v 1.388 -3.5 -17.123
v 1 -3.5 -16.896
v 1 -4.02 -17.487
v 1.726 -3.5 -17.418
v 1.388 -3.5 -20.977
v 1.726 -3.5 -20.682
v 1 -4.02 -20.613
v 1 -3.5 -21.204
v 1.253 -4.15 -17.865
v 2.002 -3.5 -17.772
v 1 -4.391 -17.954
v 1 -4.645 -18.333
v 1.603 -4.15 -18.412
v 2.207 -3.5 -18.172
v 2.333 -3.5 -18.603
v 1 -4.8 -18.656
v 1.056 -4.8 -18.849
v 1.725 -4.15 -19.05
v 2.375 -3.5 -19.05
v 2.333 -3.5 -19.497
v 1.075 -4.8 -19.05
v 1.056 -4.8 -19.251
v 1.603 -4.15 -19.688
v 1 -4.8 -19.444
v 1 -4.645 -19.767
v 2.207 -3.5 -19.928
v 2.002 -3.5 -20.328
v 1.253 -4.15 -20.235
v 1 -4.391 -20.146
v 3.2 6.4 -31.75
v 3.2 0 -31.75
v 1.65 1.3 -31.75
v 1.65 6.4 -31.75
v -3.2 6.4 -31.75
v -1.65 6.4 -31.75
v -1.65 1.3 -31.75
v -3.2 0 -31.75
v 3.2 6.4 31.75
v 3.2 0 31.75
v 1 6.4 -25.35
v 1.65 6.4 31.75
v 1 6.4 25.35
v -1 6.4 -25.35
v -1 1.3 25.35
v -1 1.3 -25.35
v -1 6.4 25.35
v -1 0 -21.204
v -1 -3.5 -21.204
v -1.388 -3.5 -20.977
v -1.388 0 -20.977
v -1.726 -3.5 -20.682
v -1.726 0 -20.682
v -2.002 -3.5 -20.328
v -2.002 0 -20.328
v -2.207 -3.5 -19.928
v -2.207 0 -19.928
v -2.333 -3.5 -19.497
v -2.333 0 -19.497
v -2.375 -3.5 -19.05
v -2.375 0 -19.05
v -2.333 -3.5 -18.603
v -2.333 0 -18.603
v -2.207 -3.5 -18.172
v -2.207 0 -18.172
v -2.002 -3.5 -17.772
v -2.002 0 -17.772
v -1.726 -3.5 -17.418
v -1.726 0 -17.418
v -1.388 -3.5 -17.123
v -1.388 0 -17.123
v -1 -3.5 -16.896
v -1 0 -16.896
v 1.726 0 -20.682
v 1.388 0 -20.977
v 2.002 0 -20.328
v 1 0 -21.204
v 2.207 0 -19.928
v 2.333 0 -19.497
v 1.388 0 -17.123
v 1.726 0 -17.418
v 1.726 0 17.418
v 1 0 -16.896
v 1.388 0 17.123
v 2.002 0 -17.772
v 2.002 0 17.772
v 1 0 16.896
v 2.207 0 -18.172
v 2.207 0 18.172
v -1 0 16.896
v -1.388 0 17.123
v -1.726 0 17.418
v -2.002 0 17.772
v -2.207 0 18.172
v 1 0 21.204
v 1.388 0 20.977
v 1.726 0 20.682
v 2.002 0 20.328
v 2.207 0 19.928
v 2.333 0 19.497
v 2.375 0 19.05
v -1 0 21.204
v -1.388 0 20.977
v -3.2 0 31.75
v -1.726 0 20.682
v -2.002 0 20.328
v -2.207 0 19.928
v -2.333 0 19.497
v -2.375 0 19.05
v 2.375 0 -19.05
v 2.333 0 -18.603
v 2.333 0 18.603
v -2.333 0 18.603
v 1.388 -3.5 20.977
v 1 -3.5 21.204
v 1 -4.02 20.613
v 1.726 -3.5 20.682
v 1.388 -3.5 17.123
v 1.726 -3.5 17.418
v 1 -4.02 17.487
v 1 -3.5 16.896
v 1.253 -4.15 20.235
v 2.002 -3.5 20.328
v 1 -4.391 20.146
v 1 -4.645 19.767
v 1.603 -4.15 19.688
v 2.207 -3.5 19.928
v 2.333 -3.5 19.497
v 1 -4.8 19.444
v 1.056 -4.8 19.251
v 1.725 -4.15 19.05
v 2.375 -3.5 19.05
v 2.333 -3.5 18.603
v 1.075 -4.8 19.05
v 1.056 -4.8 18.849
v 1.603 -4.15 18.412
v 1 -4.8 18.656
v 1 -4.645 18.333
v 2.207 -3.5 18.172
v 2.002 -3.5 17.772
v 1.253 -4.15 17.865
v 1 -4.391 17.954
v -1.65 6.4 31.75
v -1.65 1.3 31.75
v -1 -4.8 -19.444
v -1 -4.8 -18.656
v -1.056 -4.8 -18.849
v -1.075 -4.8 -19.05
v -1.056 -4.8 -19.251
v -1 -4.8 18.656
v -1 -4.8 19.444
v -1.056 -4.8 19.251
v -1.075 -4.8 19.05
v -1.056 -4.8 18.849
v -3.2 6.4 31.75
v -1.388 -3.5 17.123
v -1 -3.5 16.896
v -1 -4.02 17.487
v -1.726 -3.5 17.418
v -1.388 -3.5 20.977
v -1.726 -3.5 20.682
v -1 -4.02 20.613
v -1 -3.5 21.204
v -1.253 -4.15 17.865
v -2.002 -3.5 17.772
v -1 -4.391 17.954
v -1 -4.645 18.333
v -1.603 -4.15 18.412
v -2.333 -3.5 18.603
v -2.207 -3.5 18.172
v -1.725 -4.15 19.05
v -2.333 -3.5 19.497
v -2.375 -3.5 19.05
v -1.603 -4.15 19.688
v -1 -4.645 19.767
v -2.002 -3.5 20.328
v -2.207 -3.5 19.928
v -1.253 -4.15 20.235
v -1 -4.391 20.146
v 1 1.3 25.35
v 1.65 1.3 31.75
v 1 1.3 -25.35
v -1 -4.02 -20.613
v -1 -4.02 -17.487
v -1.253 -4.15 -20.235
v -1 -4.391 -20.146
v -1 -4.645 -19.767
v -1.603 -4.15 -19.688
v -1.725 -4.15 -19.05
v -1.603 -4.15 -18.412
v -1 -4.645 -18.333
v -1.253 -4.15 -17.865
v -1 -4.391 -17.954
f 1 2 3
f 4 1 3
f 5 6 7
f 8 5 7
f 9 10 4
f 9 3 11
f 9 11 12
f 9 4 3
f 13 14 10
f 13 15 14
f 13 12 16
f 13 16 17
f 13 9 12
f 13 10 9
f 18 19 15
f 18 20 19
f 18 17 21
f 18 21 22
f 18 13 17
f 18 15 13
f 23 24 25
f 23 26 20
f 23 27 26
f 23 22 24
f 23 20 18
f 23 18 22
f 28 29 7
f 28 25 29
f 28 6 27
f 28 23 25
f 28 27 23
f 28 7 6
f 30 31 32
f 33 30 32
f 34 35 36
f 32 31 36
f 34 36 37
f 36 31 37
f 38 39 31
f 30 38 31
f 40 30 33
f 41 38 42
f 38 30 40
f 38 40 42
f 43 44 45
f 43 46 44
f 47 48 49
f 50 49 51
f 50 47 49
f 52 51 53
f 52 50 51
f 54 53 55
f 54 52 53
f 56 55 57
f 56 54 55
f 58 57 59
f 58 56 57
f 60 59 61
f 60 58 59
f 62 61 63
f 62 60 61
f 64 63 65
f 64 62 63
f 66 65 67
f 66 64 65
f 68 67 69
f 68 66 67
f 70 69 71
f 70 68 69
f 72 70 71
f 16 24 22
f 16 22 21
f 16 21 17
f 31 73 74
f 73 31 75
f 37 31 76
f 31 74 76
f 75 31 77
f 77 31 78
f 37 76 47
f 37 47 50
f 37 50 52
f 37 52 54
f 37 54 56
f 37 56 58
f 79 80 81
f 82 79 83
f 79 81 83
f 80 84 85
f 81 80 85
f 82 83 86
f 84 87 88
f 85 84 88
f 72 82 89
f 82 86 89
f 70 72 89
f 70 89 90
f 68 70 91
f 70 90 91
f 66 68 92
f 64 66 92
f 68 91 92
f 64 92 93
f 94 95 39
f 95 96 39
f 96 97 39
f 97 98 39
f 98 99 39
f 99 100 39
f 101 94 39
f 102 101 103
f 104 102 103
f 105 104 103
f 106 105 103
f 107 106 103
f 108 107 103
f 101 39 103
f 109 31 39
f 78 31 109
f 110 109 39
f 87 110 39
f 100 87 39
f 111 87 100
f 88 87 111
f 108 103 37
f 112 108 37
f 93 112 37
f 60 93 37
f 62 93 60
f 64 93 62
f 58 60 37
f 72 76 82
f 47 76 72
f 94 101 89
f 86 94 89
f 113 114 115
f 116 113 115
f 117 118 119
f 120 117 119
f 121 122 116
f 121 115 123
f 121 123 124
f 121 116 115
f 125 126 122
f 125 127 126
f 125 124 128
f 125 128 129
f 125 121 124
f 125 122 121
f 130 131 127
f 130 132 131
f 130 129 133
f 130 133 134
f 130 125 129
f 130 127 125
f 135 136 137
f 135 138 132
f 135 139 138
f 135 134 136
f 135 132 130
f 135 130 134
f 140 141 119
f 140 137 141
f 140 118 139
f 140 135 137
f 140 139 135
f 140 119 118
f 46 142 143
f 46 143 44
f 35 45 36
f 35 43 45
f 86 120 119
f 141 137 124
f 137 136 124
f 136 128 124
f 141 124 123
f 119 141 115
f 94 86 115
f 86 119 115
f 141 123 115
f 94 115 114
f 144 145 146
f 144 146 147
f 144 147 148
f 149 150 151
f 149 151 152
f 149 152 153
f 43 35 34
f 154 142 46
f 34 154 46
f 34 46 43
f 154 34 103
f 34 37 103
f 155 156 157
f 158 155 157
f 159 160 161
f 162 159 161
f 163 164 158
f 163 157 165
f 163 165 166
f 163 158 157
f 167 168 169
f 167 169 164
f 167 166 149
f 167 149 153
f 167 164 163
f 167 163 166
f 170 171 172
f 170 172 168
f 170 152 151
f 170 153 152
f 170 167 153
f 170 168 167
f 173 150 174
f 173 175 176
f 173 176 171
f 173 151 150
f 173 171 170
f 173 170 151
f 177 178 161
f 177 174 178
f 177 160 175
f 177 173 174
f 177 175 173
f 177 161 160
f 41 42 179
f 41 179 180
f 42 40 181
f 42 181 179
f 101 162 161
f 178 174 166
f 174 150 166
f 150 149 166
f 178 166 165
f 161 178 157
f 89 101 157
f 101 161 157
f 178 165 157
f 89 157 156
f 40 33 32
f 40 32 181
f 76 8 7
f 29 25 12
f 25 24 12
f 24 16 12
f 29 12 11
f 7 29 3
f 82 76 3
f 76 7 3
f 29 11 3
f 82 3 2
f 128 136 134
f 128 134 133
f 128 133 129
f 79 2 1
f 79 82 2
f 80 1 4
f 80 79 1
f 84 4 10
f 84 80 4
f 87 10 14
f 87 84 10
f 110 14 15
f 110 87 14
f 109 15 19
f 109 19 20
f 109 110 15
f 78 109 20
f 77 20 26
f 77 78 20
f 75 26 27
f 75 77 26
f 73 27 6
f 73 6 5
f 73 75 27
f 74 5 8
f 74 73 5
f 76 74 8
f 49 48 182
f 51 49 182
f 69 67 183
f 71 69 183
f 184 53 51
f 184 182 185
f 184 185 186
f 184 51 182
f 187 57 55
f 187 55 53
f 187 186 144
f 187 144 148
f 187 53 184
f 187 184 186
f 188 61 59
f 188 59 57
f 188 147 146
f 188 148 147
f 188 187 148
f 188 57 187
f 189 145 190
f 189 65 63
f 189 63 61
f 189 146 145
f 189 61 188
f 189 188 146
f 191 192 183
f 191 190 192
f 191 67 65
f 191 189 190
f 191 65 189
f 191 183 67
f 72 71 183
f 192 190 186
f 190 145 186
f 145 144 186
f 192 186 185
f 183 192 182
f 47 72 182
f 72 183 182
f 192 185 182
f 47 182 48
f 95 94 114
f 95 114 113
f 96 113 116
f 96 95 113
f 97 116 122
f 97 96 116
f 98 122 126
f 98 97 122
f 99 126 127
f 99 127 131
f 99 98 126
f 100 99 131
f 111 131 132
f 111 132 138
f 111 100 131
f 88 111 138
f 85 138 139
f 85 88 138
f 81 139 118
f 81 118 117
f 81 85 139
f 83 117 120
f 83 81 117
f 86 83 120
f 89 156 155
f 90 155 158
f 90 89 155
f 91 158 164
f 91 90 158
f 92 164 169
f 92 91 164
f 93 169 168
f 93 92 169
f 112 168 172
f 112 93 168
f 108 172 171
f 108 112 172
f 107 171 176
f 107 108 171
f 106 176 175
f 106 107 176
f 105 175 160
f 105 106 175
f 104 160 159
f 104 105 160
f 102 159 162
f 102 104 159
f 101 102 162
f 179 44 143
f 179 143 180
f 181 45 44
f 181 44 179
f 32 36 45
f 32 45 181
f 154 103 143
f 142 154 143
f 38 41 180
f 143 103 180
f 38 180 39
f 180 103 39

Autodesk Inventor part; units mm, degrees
ref_plane "YZ Plane" through (0, 0, 0) normal (1, 0, 0) x (0, 1, 0)
ref_plane "XZ Plane" through (0, 0, 0) normal (0, 1, 0) x (-1, 0, 0)
ref_plane "XY Plane" through (0, 0, 0) normal (0, 0, 1) x (1, 0, 0)
sketch "Esquisse1" plane through (0, 0, 0) normal (0, 1, 0) x (-1, 0, 0)
  line L0 (3.2, 31.75) -> (-3.2, 31.75)
  line L1 (-3.2, 31.75) -> (-3.2, -31.75)
  line L2 (-3.2, -31.75) -> (3.2, -31.75)
  line L3 (3.2, -31.75) -> (3.2, 31.75)
  point P0 (0, 0)
  dimension "d0" = 63.5
  dimension "d1" = 6.4
  dimension "d2" = 3.2
  dimension "d3" = 31.75
extrude "Extrusion1" add sketch "Esquisse1" along normal blind 6.4
sketch "Esquisse2" plane through (0, 6.4, 0) normal (0, 1, 0) x (1, 0, 0)
  line L0 (-3.2, -31.75) -> (3.2, -31.75) projected
  line L1 (-1.65, -31.75) -> (-1, -25.35)
  line L2 (-1, -25.35) -> (-1, 25.35)
  line L3 (-1, 25.35) -> (-1.65, 31.75)
  line L4 (3.2, 31.75) -> (-3.2, 31.75) projected
  line L5 (-1.65, 31.75) -> (1.65, 31.75)
  line L6 (1.65, 31.75) -> (1, 25.35)
  line L7 (1, 25.35) -> (1, -25.35)
  line L8 (1, -25.35) -> (1.65, -31.75)
  line L9 (1.65, -31.75) -> (-1.65, -31.75)
  point P0 (0, 0)
  dimension "d6" = 3.3
  dimension "d7" = 3.3
  dimension "d8" = 1.65
  dimension "d9" = 1.65
  dimension "d10" = 2
  dimension "d11" = 1
  dimension "d12" = 6.4
  dimension "d13" = 6.4
  dimension "d14" = 6.4
  dimension "d15" = 6.4
extrude "Extrusion2" cut sketch "Esquisse2" against normal blind 5.1
sketch "Esquisse3" plane through (0, 0, 0) normal (0, -1, 0) x (1, 0, 0)
  circle A0 centre (0, 19.05) radius 2.375
  circle A1 centre (0, -19.05) radius 2.375
  line L0 (-3.2, -31.75) -> (-3.2, 31.75) projected
  line L1 (3.2, 31.75) -> (3.2, -31.75) projected
  point P0 (0, 0)
  dimension "d18" = 4.75
  dimension "d19" = 19.05
  dimension "d20" = 38.1
  dimension "d21" = 4.75
  dimension "d22" = 6.4
  dimension "d23" = 3.2
  dimension "d24" = 3.2
extrude "Extrusion3" add sketch "Esquisse3" along normal blind 4.8
sketch "Esquisse4" plane through (0, -4.8, 19.05) normal (0, -1, 0) x (1, 0, 0)
  line L0 (-1, 6.3) -> (-1, -44.4) projected
  line L1 (1, 3.95) -> (-1, 3.95)
  line L2 (-1, 3.95) -> (-1, -4.05)
  line L3 (-1, -4.05) -> (1, -4.05)
  line L4 (1, -4.05) -> (1, 3.95)
  line L5 (1, -34.05) -> (-1, -34.05)
  line L6 (-1, -34.05) -> (-1, -42.05)
  line L7 (-1, -42.05) -> (1, -42.05)
  line L8 (1, -42.05) -> (1, -34.05)
  point P0 (0, -19.05)
  point P1 (-1, 3.95)
  dimension "d27" = 2
  dimension "d28" = 15
  dimension "d29" = 15
  dimension "d30" = 8
  dimension "d31" = 8
extrude "Extrusion4" cut sketch "Esquisse4" against normal blind 4.8
chamfer "Chanfrein1" distance 1.3 angle 45 2 edges at (2.375, -4.8, 19.05) (-2.375, -4.8, 19.05)
chamfer "Chanfrein2" distance 1.3 angle 45 2 edges at (-2.375, -4.8, -19.05) (2.375, -4.8, -19.05)
equation "\"d2\" = 0.5 * d1"
equation "\"d3\" = 0.5 * d0"
equation "\"d7\" = d6"
equation "\"d8\" = 0.5 * d7"
equation "\"d9\" = 0.5 * d6"
equation "\"d11\" = 0.5 * d10"
equation "\"d13\" = d12"
equation "\"d14\" = d12"
equation "\"d15\" = d12"
equation "\"d19\" = 0.5 * d20"
equation "\"d21\" = d18"
equation "\"d23\" = 0.5 * d22"
equation "\"d24\" = d23"
properties part number "RDC-250" material "Nylon 6/6"
